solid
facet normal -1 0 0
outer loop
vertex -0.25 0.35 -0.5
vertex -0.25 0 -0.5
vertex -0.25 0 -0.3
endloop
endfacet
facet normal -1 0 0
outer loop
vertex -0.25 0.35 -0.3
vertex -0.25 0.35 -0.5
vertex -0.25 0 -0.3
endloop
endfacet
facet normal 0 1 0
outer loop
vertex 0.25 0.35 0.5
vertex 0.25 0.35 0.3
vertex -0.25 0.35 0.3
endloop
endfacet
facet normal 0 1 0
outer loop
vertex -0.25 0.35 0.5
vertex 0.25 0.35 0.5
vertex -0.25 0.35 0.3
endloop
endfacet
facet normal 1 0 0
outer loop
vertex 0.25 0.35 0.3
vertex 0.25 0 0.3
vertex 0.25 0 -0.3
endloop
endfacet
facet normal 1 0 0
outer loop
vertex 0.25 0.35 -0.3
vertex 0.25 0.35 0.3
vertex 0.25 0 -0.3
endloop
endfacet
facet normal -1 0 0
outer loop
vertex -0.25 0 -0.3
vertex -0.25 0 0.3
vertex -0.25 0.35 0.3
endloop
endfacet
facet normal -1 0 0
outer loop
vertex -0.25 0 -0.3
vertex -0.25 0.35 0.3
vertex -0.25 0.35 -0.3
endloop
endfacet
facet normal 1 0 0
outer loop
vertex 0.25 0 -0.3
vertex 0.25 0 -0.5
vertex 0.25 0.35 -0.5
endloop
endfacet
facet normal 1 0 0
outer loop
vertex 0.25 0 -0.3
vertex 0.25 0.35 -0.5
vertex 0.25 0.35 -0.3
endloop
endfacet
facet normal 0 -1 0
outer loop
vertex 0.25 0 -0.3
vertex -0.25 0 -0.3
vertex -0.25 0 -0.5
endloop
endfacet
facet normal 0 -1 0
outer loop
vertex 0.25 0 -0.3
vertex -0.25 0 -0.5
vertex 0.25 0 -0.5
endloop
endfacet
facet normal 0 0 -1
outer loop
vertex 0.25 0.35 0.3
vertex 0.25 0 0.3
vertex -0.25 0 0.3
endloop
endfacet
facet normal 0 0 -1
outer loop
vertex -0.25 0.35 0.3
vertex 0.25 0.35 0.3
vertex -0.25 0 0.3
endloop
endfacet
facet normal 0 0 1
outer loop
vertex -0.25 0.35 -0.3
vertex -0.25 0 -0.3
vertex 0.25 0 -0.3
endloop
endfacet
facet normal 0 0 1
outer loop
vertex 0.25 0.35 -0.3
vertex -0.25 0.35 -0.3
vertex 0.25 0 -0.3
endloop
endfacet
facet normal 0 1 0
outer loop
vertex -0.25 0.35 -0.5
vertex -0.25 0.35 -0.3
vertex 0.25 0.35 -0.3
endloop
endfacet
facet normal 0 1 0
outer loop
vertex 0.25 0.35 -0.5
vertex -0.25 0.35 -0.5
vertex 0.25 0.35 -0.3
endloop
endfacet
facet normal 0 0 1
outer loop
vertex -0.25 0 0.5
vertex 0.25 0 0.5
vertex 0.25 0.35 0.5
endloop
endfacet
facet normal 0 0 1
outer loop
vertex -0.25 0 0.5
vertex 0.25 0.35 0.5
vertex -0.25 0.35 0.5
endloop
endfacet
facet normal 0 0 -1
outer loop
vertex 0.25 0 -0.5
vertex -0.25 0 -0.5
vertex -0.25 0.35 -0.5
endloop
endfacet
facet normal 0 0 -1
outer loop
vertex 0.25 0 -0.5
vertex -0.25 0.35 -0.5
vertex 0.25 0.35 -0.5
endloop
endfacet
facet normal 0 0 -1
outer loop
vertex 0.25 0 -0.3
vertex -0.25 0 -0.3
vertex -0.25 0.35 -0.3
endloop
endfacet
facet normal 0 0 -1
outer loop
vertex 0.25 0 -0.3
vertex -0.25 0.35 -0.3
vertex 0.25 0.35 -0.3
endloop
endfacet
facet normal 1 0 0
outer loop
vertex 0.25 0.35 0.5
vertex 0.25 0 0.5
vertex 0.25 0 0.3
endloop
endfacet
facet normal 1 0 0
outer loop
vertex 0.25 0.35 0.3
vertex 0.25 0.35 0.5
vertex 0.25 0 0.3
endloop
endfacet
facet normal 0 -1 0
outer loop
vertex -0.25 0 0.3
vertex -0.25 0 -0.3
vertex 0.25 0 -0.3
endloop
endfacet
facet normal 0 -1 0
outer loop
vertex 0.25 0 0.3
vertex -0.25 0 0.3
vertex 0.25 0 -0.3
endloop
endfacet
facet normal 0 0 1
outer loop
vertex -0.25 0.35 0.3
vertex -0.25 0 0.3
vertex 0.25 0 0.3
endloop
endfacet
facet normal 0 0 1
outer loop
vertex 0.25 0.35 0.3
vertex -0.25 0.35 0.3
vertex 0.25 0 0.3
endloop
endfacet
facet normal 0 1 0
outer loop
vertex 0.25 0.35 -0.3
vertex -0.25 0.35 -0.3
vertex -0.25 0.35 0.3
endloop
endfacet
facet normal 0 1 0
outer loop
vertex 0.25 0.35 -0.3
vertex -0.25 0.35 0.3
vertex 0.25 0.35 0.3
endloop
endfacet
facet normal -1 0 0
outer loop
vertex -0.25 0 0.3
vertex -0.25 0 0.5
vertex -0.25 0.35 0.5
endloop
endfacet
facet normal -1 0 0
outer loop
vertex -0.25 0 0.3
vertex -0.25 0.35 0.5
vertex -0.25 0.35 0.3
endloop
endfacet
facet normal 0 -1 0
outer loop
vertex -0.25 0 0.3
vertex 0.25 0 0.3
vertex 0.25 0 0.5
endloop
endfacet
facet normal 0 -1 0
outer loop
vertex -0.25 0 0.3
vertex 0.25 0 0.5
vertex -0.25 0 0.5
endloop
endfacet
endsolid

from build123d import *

# Parameters (mm, degrees)
MAINBODYS_W     = 0.5
MAINBODYS_H     = 0.6
MAINBODY_DEPTH  = 0.35
LEFTBODYS_W     = 0.5
LEFTBODYS_H     = 0.2
LEFTBODY_DEPTH  = 0.35
RIGHTBODYS_W    = 0.5
RIGHTBODYS_H    = 0.2
RIGHTBODY_DEPTH = 0.35


with BuildPart() as part:
    # MainBodyS → MainBody (new body)
    with BuildSketch(Plane(origin=(0, 0, 0), x_dir=(1, 0, 0), z_dir=(0, 1, 0))):
        Rectangle(MAINBODYS_W, MAINBODYS_H)
    extrude(amount=MAINBODY_DEPTH)


with BuildPart() as body_2:
    # LeftBodyS → LeftBody (new body)
    with BuildSketch(Plane(origin=(0, 0, 0), x_dir=(-1, 0, 0), z_dir=(0, -1, 0))):
        with Locations((0, -0.4)):
            Rectangle(LEFTBODYS_W, LEFTBODYS_H)
    extrude(amount=-LEFTBODY_DEPTH)


with BuildPart() as body_3:
    # RightBodyS → RightBody (new body)
    with BuildSketch(Plane.XZ):
        with Locations((0, -0.4)):
            Rectangle(RIGHTBODYS_W, RIGHTBODYS_H)
    extrude(amount=-RIGHTBODY_DEPTH)


solid = Compound([part.part, body_2.part, body_3.part])
